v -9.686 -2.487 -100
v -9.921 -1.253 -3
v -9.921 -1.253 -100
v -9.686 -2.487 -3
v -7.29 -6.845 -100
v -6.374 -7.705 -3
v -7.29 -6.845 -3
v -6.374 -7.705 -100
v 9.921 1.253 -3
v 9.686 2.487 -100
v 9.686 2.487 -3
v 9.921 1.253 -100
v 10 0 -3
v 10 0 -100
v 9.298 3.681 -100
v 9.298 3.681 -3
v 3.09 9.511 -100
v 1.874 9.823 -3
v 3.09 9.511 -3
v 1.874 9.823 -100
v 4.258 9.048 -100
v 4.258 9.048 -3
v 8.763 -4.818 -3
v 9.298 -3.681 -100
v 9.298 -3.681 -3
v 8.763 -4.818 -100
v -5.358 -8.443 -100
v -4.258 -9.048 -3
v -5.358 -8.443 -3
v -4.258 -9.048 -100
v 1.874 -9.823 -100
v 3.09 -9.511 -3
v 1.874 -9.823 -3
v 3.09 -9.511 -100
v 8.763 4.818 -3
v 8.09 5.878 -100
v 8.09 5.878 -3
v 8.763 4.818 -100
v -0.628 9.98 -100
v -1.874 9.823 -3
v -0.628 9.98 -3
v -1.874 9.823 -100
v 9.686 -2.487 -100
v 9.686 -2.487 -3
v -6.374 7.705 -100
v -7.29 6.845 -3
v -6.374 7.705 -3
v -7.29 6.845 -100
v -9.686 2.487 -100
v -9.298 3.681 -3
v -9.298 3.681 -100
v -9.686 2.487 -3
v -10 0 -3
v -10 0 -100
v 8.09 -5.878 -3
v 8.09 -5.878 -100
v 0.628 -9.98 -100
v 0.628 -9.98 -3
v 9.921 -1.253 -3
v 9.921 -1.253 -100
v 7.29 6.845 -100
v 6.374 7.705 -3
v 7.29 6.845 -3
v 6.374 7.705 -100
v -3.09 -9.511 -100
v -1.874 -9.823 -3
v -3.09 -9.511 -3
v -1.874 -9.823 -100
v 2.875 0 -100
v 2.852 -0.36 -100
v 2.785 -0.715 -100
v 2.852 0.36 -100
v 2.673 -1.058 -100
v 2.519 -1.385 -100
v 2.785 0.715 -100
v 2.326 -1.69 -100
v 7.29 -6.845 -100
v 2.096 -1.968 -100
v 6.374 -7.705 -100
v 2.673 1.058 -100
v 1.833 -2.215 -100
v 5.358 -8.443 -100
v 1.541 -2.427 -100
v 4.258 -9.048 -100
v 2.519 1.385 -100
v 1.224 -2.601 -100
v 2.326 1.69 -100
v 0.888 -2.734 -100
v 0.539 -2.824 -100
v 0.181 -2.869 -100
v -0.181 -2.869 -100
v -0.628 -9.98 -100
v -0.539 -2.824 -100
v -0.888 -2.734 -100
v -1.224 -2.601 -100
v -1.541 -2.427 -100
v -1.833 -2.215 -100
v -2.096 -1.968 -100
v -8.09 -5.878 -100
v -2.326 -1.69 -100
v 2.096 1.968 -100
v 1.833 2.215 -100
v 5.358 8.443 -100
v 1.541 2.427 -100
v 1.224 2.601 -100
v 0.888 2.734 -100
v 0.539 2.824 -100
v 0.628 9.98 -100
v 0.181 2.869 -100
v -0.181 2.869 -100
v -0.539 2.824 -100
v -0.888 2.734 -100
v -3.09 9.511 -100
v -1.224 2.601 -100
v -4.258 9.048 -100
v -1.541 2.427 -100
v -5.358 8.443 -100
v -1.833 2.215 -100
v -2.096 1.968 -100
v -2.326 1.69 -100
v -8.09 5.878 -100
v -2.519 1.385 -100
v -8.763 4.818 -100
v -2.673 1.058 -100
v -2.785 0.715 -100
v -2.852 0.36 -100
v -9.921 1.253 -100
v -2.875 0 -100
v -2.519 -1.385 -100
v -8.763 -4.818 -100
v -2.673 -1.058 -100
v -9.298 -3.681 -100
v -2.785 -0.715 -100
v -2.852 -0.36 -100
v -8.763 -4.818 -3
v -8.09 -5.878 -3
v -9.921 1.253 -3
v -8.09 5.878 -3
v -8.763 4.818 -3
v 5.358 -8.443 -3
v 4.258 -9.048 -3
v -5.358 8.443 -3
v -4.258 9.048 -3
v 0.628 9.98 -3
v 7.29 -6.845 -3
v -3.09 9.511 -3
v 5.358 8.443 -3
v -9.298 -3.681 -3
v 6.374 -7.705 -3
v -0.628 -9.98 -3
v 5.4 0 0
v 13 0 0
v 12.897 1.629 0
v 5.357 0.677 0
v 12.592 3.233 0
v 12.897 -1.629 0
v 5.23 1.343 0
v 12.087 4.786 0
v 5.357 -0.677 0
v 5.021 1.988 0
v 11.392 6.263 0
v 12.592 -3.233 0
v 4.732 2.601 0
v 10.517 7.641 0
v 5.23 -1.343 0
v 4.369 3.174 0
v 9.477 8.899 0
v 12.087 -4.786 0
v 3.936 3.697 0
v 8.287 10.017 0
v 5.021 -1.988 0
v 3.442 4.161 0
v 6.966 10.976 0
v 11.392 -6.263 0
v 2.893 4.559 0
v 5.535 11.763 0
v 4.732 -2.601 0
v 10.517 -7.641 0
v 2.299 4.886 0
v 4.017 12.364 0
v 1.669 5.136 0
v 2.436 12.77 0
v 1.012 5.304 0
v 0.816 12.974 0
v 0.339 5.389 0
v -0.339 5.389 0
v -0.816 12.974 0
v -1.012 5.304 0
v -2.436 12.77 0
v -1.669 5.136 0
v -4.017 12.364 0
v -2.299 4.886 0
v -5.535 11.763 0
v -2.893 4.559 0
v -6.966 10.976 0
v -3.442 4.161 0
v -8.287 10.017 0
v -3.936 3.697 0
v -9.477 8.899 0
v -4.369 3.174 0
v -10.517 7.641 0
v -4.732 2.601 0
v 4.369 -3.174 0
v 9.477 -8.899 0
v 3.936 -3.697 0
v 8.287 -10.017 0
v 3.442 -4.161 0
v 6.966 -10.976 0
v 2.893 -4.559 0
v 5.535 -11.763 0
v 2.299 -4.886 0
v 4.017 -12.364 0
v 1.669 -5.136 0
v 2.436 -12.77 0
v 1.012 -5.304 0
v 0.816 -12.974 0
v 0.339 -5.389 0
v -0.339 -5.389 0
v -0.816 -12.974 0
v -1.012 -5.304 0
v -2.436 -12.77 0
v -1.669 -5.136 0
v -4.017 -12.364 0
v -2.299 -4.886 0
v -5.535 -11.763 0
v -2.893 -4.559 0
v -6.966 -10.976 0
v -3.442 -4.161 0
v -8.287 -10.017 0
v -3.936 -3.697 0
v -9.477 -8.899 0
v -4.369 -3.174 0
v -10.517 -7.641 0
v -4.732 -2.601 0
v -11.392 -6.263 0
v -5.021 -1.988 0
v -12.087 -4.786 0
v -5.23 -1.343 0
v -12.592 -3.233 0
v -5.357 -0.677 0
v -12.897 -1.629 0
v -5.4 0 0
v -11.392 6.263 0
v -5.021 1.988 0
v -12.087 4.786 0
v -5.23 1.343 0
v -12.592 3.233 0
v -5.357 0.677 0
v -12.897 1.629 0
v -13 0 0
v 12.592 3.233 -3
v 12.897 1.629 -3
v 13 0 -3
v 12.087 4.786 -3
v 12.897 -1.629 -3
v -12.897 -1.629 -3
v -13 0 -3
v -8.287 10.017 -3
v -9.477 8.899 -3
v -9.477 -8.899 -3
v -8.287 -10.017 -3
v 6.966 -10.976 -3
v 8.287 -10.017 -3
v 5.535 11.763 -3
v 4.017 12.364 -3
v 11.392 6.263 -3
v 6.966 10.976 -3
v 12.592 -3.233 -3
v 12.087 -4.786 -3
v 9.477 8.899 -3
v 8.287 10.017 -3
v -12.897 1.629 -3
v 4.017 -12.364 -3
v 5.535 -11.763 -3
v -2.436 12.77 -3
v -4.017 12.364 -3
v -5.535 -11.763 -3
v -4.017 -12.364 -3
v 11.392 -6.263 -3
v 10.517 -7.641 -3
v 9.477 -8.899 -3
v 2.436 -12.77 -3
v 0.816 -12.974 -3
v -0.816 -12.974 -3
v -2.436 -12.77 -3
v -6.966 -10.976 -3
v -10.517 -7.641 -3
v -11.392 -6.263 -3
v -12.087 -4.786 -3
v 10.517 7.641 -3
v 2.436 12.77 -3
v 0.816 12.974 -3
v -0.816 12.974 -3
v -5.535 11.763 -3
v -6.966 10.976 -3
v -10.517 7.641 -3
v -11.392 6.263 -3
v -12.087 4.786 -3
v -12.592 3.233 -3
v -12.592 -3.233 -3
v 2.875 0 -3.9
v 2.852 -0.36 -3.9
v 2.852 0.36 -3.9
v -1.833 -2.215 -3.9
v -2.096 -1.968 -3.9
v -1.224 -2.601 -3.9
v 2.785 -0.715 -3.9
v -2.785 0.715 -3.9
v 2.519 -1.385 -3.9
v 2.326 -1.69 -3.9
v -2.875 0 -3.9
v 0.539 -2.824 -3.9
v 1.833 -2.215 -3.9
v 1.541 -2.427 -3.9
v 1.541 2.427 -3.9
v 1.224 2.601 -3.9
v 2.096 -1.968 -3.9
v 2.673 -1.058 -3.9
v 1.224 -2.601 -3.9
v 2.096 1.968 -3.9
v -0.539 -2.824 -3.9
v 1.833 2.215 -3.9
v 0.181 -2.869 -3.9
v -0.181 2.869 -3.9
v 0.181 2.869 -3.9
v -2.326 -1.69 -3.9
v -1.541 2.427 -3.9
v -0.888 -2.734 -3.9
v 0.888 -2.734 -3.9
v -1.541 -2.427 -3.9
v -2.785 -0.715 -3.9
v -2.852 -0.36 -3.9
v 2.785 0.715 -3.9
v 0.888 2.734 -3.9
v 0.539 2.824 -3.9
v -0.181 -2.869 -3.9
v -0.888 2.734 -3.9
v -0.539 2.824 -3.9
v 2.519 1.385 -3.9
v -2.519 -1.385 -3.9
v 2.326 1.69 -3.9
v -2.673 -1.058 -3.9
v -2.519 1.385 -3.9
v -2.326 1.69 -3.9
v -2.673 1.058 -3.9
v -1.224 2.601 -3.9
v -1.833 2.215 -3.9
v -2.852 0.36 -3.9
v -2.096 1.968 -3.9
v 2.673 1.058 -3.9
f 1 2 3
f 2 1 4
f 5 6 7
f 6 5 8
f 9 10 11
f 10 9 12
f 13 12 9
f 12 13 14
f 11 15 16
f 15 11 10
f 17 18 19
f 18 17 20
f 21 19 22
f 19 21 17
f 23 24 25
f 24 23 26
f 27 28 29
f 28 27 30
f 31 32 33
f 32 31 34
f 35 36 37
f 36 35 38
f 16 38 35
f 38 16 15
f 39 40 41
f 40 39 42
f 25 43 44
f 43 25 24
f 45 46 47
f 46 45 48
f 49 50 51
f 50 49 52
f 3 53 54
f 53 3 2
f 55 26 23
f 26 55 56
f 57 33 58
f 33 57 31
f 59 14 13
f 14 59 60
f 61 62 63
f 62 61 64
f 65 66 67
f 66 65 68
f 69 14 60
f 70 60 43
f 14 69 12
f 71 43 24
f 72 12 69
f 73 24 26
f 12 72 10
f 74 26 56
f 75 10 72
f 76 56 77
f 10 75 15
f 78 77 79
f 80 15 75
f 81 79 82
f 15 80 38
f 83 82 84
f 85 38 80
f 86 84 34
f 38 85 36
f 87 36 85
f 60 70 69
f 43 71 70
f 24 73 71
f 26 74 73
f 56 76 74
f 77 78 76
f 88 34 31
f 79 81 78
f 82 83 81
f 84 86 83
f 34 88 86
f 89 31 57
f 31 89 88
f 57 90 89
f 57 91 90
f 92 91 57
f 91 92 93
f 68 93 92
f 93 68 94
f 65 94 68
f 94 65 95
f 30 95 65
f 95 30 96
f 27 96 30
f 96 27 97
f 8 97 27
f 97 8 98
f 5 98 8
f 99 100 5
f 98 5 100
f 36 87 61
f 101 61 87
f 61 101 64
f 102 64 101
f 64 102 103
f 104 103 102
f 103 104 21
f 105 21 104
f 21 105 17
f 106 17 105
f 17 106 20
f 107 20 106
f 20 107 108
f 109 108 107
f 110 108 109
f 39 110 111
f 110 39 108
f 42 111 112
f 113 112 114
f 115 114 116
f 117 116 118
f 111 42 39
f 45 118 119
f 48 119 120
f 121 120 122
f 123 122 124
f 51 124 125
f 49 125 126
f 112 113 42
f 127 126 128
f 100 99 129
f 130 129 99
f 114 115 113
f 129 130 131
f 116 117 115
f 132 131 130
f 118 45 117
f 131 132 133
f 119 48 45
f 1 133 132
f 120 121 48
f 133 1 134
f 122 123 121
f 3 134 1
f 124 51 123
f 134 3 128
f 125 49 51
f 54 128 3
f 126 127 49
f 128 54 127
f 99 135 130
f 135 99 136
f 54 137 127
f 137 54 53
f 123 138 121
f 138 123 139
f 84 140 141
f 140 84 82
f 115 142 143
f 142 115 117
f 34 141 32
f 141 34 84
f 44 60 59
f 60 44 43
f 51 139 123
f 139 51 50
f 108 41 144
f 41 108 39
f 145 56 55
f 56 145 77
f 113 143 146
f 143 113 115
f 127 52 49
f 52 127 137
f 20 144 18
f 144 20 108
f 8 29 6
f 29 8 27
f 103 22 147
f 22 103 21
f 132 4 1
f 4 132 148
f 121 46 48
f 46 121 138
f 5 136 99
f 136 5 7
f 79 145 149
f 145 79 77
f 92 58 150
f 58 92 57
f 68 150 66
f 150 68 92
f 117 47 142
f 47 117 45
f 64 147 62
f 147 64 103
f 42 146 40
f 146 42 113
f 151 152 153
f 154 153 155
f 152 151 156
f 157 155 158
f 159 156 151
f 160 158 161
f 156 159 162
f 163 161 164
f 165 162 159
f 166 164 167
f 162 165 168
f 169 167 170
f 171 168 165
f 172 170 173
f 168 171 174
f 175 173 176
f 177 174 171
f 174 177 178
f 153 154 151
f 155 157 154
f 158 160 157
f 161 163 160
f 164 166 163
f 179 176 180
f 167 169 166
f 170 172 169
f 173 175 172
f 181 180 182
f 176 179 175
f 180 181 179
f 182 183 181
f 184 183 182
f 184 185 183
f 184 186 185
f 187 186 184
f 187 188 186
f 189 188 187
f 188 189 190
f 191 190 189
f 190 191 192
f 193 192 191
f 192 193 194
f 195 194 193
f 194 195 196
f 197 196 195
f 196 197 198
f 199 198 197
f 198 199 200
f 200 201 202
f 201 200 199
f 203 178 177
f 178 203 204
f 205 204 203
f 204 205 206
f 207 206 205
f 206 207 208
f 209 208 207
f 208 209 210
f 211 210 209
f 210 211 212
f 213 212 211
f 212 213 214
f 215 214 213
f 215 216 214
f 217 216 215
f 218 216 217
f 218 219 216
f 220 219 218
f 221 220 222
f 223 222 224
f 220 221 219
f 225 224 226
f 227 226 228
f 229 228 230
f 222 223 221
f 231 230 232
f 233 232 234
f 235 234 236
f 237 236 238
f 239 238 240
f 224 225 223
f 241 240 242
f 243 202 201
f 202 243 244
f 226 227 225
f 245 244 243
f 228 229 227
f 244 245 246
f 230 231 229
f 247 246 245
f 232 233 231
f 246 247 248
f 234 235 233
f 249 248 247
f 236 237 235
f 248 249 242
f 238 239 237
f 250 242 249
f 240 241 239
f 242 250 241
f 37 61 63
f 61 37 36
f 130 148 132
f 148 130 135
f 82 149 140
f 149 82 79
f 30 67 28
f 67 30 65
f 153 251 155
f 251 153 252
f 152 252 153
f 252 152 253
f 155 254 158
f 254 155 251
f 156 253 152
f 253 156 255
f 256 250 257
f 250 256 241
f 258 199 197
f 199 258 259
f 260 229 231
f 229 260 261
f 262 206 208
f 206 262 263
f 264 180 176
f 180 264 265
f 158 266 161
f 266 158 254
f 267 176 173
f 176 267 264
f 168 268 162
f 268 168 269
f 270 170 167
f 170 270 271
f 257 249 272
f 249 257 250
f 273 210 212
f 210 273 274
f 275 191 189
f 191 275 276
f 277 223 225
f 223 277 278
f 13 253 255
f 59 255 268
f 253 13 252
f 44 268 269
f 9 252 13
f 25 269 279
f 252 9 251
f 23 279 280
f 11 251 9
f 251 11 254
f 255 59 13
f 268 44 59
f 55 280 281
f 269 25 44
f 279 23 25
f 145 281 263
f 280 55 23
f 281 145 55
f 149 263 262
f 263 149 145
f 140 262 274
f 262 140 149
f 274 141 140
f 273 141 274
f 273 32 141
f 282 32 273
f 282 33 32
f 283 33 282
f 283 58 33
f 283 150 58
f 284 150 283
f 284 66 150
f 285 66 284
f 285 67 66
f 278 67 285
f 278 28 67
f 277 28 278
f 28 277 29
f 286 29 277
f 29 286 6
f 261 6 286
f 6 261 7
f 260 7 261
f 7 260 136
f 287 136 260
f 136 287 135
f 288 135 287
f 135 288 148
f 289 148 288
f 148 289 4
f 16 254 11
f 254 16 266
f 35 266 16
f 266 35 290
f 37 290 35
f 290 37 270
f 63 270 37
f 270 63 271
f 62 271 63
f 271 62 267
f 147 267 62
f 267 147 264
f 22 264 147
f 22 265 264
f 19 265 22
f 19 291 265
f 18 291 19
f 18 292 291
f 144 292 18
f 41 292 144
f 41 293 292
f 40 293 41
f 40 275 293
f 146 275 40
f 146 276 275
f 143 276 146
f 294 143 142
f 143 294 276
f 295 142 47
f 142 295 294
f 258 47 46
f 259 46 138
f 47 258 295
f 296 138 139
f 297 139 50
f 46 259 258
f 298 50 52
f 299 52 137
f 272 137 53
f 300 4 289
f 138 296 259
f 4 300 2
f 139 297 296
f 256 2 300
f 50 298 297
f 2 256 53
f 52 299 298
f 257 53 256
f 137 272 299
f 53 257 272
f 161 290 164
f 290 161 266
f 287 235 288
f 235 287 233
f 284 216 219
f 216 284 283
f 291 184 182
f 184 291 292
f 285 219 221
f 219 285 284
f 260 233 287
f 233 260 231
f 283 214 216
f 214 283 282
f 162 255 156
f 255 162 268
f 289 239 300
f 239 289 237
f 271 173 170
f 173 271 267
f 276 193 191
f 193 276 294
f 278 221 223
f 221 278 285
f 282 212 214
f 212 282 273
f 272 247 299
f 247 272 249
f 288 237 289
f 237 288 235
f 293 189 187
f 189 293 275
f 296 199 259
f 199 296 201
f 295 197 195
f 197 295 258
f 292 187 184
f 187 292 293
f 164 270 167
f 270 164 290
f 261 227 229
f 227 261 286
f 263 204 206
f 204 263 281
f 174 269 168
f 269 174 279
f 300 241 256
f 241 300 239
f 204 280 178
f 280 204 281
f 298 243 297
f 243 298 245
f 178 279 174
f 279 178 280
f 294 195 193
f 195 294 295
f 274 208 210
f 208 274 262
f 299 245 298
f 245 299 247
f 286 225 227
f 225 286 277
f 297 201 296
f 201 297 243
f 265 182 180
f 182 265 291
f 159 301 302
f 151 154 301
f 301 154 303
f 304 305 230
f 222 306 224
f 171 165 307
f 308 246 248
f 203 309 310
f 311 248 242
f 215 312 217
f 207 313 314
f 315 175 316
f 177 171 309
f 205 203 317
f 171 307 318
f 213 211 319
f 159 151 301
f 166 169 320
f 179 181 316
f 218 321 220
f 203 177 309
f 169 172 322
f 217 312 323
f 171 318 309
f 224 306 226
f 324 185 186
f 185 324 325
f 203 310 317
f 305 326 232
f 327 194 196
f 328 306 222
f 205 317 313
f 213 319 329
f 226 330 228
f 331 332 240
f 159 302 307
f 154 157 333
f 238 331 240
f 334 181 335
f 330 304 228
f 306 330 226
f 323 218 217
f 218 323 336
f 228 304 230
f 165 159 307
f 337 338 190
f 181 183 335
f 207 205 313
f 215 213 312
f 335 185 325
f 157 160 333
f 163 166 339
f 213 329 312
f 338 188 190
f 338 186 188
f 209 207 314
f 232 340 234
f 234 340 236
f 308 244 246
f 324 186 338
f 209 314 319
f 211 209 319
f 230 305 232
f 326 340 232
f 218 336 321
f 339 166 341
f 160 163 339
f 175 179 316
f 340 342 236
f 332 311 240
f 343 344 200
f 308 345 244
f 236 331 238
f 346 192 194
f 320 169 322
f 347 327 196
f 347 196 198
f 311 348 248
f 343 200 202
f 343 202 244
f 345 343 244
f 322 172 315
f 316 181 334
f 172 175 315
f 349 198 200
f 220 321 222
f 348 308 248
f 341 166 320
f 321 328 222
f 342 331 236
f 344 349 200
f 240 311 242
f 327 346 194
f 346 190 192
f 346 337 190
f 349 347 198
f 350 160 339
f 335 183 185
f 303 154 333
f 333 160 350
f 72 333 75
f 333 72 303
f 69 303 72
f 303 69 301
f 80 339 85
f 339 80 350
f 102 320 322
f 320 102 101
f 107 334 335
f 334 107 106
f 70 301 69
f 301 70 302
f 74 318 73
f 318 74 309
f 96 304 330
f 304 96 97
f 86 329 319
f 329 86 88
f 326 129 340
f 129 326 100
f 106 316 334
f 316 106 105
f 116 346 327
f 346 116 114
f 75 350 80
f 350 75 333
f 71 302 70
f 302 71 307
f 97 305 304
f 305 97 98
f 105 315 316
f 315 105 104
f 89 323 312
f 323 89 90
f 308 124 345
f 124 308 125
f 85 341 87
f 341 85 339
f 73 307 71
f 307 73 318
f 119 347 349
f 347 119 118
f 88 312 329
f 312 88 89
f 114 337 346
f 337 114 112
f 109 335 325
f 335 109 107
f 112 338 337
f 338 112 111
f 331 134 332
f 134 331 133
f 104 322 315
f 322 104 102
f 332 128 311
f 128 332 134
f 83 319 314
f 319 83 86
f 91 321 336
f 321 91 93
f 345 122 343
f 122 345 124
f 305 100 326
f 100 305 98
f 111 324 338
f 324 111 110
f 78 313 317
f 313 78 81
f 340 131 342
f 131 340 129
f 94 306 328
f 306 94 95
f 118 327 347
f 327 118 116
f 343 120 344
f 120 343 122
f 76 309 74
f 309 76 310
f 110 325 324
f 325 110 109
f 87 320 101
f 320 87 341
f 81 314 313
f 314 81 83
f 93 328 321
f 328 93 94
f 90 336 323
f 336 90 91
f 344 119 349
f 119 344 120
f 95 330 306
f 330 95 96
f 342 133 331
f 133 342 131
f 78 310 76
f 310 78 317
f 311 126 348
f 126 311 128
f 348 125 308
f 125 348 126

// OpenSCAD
$fn = 50;


difference() {
	union() {
		translate(v = [0, 0, -100.0000000000]) {
			cylinder(h = 100, r = 10.0000000000);
		}
		translate(v = [0, 0, -3.0000000000]) {
			cylinder(h = 3, r = 13.0000000000);
		}
	}
	union() {
		translate(v = [0, 0, 0]) {
			rotate(a = [0, 0, 0]) {
				difference() {
					union() {
						#translate(v = [0, 0, -100.0000000000]) {
							cylinder(h = 100, r = 2.6000000000);
						}
						#translate(v = [0, 0, -3.9000000000]) {
							cylinder(h = 3.9000000000, r = 10.0000000000, r1 = 2.8750000000, r2 = 5.4000000000);
						}
						#translate(v = [0, 0, -100.0000000000]) {
							cylinder(h = 100, r = 2.8750000000);
						}
						#translate(v = [0, 0, -100.0000000000]) {
							cylinder(h = 100, r = 2.6000000000);
						}
					}
					union();
				}
			}
		}
	}
}
